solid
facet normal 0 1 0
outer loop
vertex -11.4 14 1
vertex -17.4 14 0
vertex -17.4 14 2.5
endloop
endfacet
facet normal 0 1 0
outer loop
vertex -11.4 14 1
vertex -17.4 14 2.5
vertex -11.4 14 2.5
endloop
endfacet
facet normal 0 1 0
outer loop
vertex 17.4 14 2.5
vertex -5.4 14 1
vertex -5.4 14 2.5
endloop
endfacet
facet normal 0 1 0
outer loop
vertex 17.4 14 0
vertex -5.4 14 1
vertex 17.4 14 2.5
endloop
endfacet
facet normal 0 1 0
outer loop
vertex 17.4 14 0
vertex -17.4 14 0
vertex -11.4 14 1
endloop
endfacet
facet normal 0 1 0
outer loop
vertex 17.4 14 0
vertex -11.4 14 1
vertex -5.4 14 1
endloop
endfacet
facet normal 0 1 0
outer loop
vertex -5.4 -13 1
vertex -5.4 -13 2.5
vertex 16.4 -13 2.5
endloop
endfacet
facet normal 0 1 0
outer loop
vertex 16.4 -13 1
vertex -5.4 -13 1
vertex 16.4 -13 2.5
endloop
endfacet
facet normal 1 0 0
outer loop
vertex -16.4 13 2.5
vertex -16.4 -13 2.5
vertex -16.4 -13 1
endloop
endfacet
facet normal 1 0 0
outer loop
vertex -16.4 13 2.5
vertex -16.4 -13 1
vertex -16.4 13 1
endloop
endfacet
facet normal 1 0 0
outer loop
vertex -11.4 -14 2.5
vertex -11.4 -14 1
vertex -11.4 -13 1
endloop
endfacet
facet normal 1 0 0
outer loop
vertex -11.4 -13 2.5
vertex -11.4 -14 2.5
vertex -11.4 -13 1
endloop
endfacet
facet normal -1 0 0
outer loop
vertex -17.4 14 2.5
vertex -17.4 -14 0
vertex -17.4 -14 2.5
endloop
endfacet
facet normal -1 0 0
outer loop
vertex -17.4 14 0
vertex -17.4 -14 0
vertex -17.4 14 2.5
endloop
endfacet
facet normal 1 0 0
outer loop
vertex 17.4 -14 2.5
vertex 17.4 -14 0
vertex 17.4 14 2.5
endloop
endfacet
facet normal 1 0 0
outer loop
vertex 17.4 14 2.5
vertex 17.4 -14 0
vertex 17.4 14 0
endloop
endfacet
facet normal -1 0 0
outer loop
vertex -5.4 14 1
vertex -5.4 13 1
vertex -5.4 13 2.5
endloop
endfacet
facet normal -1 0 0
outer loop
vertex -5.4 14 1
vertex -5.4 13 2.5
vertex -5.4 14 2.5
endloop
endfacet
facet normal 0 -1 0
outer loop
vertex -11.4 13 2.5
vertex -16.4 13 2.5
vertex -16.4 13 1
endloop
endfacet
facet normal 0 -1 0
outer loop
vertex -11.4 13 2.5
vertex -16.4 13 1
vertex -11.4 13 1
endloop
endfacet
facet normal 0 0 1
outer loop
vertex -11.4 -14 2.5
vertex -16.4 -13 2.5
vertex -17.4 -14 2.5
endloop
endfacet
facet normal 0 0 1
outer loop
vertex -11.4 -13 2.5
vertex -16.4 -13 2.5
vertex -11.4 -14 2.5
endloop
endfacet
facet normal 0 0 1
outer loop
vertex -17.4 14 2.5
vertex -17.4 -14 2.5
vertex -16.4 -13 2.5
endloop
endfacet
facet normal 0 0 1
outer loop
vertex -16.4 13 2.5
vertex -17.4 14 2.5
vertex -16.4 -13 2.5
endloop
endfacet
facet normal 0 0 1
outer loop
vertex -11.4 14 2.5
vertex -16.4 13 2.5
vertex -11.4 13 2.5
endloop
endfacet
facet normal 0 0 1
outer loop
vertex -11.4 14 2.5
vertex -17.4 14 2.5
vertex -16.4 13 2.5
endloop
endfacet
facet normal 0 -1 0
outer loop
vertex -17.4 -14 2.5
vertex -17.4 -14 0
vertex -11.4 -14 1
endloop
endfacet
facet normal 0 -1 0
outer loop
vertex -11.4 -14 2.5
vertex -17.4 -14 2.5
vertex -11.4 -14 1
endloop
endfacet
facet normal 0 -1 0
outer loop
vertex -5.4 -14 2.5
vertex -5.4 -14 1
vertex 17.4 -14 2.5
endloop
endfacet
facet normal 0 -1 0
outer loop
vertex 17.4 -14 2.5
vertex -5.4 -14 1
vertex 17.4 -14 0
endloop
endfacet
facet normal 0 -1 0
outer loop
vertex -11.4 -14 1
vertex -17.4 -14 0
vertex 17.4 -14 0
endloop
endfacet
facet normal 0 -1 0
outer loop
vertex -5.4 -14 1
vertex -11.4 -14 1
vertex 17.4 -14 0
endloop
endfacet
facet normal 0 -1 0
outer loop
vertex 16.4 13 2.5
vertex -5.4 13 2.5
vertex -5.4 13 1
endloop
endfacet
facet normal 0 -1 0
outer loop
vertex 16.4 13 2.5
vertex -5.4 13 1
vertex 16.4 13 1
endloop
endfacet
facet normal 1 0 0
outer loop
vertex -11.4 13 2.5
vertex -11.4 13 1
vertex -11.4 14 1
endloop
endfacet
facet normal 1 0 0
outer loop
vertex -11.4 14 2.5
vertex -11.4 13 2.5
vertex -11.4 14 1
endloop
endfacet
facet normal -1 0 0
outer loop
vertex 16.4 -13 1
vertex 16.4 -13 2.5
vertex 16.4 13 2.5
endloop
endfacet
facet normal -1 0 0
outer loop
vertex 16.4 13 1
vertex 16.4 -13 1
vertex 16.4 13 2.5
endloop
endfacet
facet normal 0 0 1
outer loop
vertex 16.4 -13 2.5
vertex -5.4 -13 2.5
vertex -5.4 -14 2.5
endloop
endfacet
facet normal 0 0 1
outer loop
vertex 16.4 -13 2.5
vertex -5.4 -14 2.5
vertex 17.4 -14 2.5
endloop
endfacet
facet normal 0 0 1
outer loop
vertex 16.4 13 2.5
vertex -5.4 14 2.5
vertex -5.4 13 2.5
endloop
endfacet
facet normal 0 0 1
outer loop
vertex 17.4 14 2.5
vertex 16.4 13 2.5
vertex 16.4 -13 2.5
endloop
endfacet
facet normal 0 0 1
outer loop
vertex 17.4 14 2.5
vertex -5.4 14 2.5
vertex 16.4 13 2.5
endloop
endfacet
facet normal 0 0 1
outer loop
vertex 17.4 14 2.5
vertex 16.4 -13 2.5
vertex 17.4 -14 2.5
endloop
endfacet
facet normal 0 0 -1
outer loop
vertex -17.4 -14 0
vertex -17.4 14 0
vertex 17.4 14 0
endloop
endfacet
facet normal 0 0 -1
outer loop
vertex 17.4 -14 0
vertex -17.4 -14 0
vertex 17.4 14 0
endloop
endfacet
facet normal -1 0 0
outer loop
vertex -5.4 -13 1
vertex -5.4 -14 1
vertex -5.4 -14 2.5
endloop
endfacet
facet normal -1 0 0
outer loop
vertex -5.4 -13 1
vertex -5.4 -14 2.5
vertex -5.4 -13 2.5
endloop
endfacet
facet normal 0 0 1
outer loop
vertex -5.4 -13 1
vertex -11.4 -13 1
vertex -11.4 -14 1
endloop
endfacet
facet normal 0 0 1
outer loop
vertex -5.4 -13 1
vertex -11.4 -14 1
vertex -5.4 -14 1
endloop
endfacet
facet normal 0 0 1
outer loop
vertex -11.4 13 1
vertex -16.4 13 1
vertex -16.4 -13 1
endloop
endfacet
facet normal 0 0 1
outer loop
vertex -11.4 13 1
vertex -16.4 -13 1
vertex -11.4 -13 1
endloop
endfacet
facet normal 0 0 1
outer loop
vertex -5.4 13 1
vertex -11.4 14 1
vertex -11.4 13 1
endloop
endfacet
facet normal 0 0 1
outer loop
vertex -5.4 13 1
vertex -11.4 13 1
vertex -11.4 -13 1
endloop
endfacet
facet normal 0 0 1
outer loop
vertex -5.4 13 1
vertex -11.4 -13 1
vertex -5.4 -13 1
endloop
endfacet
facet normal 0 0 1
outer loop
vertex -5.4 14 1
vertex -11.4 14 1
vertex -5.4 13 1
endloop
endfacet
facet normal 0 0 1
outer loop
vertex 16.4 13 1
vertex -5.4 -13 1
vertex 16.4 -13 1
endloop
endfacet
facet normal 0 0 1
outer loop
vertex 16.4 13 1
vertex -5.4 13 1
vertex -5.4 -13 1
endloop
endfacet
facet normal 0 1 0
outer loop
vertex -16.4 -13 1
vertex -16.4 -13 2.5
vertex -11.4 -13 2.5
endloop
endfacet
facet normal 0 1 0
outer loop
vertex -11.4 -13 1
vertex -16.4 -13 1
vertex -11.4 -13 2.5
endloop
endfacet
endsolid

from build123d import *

# Parameters (mm, degrees)
F0_W     = 34.8
F0_H     = 28
F1_DEPTH = 2.5
F2_W     = 32.8
F2_H     = 26
F3_DEPTH = 1.5
F4_W     = 6
F4_H     = 28
F5_DEPTH = 1.5


with BuildPart() as f1:
    # F0 (on Top) → F1 (new body)
    with BuildSketch(Plane.XY):
        Rectangle(F0_W, F0_H)
    extrude(amount=F1_DEPTH)

    # F2 (on face) → F3 (cut)
    with BuildSketch(Plane.XY.offset(2.5)):
        Rectangle(F2_W, F2_H)
    extrude(amount=-F3_DEPTH, mode=Mode.SUBTRACT)

    # F4 (on face) → F5 (cut)
    with BuildSketch(Plane.XY.offset(1)):
        with Locations((-8.4, 0)):
            Rectangle(F4_W, F4_H)
    extrude(amount=F5_DEPTH, mode=Mode.SUBTRACT)


solid = f1.part
